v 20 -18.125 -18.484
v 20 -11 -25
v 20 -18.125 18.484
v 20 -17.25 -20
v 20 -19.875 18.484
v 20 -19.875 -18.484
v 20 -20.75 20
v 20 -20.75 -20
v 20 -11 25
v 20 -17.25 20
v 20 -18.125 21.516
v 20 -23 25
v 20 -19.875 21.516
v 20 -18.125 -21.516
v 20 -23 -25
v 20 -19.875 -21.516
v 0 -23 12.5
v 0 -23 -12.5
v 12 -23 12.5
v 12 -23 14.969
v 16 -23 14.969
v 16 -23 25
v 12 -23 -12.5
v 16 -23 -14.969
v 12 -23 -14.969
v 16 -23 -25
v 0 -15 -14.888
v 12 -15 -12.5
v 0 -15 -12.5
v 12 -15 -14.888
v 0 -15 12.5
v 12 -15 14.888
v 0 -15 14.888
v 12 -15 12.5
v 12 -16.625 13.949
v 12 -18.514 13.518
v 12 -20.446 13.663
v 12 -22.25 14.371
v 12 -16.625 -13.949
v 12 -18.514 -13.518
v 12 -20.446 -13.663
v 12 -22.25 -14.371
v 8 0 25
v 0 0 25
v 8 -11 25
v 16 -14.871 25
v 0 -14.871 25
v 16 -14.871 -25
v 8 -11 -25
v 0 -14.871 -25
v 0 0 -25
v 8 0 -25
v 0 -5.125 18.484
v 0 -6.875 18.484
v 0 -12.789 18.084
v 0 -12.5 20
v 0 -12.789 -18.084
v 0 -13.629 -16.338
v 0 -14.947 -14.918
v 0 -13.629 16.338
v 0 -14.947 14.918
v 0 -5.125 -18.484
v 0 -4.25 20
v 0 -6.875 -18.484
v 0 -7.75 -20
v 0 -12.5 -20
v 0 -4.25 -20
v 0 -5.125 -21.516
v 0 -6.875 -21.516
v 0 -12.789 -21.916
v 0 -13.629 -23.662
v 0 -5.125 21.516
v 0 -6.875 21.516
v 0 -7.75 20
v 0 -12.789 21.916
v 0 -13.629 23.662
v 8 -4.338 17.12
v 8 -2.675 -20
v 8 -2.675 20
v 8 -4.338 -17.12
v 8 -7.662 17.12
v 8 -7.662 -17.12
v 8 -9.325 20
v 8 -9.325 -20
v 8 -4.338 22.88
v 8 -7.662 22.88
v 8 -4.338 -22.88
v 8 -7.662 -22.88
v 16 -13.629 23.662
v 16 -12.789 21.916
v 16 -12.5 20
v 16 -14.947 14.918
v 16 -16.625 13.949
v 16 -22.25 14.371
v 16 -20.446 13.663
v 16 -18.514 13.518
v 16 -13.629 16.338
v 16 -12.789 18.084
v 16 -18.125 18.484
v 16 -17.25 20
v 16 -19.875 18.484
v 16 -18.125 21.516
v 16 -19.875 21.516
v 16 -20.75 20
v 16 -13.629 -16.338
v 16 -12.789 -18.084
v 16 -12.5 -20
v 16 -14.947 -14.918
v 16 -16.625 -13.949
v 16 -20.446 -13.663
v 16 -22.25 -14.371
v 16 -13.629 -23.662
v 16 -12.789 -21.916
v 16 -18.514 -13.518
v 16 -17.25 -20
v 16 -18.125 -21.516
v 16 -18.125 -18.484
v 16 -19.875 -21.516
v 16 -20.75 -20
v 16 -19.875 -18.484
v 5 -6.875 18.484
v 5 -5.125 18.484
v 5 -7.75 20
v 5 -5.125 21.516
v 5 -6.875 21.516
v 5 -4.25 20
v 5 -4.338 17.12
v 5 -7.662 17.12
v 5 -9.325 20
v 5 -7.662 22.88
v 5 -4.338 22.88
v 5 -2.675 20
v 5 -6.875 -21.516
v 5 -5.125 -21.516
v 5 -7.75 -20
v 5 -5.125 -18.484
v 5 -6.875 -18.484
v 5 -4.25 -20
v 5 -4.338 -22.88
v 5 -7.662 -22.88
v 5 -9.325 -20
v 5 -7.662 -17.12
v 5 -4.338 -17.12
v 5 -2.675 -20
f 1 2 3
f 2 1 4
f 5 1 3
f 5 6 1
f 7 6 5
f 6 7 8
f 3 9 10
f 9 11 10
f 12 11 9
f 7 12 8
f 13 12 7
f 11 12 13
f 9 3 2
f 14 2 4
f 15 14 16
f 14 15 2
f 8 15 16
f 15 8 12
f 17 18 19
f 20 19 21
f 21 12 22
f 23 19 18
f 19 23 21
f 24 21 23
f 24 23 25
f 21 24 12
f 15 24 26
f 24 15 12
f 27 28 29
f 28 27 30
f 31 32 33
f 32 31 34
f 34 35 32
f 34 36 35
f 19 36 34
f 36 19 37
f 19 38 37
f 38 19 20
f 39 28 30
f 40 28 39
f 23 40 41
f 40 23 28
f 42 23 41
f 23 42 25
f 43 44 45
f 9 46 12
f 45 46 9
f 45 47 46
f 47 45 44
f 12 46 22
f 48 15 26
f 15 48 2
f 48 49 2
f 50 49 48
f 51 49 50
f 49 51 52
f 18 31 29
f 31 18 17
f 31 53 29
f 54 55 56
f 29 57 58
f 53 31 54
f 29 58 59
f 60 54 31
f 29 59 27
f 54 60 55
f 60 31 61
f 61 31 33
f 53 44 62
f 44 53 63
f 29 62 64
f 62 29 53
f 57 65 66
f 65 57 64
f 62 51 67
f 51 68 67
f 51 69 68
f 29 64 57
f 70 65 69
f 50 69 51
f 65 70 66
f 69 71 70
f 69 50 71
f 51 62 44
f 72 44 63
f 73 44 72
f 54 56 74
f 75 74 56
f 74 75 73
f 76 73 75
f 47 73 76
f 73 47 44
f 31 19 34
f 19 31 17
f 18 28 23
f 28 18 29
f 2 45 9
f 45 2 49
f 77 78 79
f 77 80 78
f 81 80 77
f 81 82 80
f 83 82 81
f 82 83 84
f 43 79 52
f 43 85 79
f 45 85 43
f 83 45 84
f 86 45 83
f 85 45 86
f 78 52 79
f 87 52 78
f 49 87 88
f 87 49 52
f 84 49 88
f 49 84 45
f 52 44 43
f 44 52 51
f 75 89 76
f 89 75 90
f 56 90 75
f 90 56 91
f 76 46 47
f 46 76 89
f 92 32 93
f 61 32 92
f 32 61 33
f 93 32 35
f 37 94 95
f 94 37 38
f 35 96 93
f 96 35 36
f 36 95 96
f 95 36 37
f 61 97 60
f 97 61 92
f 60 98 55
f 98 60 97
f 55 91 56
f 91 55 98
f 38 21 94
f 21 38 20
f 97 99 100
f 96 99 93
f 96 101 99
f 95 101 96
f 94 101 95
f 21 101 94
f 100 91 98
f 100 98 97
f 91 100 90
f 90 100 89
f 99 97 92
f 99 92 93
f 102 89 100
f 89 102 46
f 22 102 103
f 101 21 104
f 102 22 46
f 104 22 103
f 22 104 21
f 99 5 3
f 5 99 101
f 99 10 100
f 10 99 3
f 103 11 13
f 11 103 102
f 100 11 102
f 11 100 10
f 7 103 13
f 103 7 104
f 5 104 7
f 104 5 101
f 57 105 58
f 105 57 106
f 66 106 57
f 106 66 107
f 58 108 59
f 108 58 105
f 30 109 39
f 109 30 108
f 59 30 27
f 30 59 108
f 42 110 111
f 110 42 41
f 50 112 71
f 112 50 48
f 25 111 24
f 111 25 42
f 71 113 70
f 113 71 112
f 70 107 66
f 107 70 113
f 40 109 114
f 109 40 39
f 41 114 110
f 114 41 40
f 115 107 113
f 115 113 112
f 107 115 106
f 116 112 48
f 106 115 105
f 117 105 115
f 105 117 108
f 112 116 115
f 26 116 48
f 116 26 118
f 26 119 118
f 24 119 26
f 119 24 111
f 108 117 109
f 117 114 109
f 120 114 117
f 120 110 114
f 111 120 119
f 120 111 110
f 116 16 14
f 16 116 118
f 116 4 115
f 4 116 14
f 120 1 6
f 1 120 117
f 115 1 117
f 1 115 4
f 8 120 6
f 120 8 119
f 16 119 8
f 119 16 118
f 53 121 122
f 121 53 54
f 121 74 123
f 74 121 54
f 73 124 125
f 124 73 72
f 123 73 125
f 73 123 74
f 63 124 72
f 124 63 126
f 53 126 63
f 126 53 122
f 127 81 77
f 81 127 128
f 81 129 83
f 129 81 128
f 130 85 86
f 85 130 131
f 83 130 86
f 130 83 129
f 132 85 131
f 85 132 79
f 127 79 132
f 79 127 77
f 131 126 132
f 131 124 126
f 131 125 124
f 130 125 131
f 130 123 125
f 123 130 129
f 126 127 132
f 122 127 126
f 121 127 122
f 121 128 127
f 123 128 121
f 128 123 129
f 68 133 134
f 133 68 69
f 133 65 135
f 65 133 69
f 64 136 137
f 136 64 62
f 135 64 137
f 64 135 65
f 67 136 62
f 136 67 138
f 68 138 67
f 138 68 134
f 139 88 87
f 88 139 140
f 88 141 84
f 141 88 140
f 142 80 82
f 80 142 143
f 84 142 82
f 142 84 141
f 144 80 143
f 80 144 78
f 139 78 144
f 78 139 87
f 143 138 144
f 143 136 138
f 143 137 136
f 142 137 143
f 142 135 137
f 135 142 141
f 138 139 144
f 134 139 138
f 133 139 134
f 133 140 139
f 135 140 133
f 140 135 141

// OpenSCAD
mountingHolesSpacing = 40;
mountingHolesDia = 3.5;
width = mountingHolesSpacing+10;
totalSpacing = 20;

// print with support material, 30-50% infill 
rotate([90,0,0])
difference(){
    union(){
        translate([totalSpacing-8,-width/2,15]) cube([8,width,8]);
        translate([0,-width/4,15]) cube([16,width/2,8]);
        translate([0,-width/2,11]) cube([totalSpacing,width,4]);
        translate([0,-width/2,0]) cube([8,width,15]);
    }
    
    for(i=[1,-1])
        translate([0,i*mountingHolesSpacing/2,19]) rotate([0,90,0]){ 
                cylinder(r=6.5, h=totalSpacing-4); cylinder(r=mountingHolesDia/2, h=totalSpacing);
    }
    // tool holder holes
    for(i=[1,-1])
        translate([8,i*mountingHolesSpacing/2,6]) rotate([0,-90,0]){cylinder(r=mountingHolesDia/2, h=41); cylinder(r=mountingHolesDia*0.95, h=3, $fn = 6);}
}
